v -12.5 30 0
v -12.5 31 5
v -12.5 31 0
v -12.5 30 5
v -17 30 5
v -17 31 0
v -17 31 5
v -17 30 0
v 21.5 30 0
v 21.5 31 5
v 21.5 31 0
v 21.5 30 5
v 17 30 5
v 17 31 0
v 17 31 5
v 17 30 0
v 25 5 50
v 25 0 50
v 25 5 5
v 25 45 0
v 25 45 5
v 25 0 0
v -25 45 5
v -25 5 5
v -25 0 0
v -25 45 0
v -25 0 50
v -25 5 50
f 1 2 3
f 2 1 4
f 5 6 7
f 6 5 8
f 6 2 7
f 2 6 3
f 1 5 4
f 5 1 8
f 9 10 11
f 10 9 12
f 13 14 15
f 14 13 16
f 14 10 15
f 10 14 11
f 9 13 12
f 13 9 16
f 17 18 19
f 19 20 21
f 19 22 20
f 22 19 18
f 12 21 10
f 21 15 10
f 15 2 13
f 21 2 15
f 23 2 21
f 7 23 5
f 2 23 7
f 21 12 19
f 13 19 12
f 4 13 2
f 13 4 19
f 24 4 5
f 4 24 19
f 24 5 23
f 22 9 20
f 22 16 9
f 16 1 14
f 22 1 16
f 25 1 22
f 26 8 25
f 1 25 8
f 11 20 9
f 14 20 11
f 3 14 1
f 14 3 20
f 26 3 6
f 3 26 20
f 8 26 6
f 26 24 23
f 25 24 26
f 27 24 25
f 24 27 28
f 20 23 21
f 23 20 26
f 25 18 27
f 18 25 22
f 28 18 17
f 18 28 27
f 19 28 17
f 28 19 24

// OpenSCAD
// L-shaped mounting bracket for NEMA 17 stepper motor (syringe pump)
// Print orientation: base plate on bed, vertical motor plate builds up +Z

// ---------------- Parameters ----------------
base_x0      = -25;   // base plate x start
base_x1      = 25;    // base plate x end
base_y0      = 0;     // base plate y start
base_y1      = 45;    // base plate y end
base_z       = 5;     // base plate thickness

motor_x0     = -25;   // motor plate x start
motor_x1     = 25;    // motor plate x end
motor_y      = 5;     // motor plate thickness (y end)
motor_z      = 50;    // motor plate height (z end)

boss_d       = 23;    // motor centring boss hole diameter
boss_x       = 0;     // boss hole centre x
boss_z       = 28;    // boss hole centre z

screw_d      = 3.4;   // M3 screw holes diameter
screw_n      = 4;     // number of screw holes
screw_pitch  = 31;    // square pattern side length

gusset_t     = 5;     // gusset thickness (x direction)
gusset_leg   = 20;    // right triangle legs along +Y and +Z
gusset_x0    = -25;   // left gusset start x
gusset_x1    = -20;   // left gusset end x
gusset_x2    = 20;    // right gusset start x
gusset_x3    = 25;    // right gusset end x

eps          = 0.5;   // cutter overshoot past faces

$fn = 96;

// ---------------- Model ----------------
union() {
    // Base plate with two vertical through-holes (M4)
    difference() {
        translate([base_x0, base_y0, 0])
            cube([base_x1 - base_x0, base_y1 - base_y0, base_z]);
        for (sx = [-17, 17])
            translate([sx, base_y1 - 15, -eps])
                cube([4.5, 1, base_z + 2 * eps]);
    }

    // Vertical motor plate standing on back edge of base
    difference() {
        translate([motor_x0, 0, 0])
            cube([motor_x1 - motor_x0, motor_y, motor_z]);
        // Boss hole along Y, centred at x = 0, z = 28
        translate([boss_x, -eps, boss_z])
            rotate([90, 0, 0])
                cylinder(d = boss_d, h = motor_y + 2 * eps);
        // M3 screw holes on 31 mm square pattern centred on boss hole
        for (i = [0 : screw_n - 1]) {
            a = screw_pitch / 2;
            x = a * cos(45 + i * 90);
            z = boss_z + a * sin(45 + i * 90);
            translate([x, -eps, z])
                rotate([90, 0, 0])
                    cylinder(d = screw_d, h = motor_y + 2 * eps);
        }
    }

    // Gussets flush with left and right edges
    for (gx = [gusset_x0, gusset_x2]) {
        translate([gx, gusset_x1 - gx, 0])
            linear_extrude(gusset_t)
                translate([0, gusset_leg, gusset_leg])
                    cube([gusset_leg, gusset_leg, gusset_t]);
    }
}
